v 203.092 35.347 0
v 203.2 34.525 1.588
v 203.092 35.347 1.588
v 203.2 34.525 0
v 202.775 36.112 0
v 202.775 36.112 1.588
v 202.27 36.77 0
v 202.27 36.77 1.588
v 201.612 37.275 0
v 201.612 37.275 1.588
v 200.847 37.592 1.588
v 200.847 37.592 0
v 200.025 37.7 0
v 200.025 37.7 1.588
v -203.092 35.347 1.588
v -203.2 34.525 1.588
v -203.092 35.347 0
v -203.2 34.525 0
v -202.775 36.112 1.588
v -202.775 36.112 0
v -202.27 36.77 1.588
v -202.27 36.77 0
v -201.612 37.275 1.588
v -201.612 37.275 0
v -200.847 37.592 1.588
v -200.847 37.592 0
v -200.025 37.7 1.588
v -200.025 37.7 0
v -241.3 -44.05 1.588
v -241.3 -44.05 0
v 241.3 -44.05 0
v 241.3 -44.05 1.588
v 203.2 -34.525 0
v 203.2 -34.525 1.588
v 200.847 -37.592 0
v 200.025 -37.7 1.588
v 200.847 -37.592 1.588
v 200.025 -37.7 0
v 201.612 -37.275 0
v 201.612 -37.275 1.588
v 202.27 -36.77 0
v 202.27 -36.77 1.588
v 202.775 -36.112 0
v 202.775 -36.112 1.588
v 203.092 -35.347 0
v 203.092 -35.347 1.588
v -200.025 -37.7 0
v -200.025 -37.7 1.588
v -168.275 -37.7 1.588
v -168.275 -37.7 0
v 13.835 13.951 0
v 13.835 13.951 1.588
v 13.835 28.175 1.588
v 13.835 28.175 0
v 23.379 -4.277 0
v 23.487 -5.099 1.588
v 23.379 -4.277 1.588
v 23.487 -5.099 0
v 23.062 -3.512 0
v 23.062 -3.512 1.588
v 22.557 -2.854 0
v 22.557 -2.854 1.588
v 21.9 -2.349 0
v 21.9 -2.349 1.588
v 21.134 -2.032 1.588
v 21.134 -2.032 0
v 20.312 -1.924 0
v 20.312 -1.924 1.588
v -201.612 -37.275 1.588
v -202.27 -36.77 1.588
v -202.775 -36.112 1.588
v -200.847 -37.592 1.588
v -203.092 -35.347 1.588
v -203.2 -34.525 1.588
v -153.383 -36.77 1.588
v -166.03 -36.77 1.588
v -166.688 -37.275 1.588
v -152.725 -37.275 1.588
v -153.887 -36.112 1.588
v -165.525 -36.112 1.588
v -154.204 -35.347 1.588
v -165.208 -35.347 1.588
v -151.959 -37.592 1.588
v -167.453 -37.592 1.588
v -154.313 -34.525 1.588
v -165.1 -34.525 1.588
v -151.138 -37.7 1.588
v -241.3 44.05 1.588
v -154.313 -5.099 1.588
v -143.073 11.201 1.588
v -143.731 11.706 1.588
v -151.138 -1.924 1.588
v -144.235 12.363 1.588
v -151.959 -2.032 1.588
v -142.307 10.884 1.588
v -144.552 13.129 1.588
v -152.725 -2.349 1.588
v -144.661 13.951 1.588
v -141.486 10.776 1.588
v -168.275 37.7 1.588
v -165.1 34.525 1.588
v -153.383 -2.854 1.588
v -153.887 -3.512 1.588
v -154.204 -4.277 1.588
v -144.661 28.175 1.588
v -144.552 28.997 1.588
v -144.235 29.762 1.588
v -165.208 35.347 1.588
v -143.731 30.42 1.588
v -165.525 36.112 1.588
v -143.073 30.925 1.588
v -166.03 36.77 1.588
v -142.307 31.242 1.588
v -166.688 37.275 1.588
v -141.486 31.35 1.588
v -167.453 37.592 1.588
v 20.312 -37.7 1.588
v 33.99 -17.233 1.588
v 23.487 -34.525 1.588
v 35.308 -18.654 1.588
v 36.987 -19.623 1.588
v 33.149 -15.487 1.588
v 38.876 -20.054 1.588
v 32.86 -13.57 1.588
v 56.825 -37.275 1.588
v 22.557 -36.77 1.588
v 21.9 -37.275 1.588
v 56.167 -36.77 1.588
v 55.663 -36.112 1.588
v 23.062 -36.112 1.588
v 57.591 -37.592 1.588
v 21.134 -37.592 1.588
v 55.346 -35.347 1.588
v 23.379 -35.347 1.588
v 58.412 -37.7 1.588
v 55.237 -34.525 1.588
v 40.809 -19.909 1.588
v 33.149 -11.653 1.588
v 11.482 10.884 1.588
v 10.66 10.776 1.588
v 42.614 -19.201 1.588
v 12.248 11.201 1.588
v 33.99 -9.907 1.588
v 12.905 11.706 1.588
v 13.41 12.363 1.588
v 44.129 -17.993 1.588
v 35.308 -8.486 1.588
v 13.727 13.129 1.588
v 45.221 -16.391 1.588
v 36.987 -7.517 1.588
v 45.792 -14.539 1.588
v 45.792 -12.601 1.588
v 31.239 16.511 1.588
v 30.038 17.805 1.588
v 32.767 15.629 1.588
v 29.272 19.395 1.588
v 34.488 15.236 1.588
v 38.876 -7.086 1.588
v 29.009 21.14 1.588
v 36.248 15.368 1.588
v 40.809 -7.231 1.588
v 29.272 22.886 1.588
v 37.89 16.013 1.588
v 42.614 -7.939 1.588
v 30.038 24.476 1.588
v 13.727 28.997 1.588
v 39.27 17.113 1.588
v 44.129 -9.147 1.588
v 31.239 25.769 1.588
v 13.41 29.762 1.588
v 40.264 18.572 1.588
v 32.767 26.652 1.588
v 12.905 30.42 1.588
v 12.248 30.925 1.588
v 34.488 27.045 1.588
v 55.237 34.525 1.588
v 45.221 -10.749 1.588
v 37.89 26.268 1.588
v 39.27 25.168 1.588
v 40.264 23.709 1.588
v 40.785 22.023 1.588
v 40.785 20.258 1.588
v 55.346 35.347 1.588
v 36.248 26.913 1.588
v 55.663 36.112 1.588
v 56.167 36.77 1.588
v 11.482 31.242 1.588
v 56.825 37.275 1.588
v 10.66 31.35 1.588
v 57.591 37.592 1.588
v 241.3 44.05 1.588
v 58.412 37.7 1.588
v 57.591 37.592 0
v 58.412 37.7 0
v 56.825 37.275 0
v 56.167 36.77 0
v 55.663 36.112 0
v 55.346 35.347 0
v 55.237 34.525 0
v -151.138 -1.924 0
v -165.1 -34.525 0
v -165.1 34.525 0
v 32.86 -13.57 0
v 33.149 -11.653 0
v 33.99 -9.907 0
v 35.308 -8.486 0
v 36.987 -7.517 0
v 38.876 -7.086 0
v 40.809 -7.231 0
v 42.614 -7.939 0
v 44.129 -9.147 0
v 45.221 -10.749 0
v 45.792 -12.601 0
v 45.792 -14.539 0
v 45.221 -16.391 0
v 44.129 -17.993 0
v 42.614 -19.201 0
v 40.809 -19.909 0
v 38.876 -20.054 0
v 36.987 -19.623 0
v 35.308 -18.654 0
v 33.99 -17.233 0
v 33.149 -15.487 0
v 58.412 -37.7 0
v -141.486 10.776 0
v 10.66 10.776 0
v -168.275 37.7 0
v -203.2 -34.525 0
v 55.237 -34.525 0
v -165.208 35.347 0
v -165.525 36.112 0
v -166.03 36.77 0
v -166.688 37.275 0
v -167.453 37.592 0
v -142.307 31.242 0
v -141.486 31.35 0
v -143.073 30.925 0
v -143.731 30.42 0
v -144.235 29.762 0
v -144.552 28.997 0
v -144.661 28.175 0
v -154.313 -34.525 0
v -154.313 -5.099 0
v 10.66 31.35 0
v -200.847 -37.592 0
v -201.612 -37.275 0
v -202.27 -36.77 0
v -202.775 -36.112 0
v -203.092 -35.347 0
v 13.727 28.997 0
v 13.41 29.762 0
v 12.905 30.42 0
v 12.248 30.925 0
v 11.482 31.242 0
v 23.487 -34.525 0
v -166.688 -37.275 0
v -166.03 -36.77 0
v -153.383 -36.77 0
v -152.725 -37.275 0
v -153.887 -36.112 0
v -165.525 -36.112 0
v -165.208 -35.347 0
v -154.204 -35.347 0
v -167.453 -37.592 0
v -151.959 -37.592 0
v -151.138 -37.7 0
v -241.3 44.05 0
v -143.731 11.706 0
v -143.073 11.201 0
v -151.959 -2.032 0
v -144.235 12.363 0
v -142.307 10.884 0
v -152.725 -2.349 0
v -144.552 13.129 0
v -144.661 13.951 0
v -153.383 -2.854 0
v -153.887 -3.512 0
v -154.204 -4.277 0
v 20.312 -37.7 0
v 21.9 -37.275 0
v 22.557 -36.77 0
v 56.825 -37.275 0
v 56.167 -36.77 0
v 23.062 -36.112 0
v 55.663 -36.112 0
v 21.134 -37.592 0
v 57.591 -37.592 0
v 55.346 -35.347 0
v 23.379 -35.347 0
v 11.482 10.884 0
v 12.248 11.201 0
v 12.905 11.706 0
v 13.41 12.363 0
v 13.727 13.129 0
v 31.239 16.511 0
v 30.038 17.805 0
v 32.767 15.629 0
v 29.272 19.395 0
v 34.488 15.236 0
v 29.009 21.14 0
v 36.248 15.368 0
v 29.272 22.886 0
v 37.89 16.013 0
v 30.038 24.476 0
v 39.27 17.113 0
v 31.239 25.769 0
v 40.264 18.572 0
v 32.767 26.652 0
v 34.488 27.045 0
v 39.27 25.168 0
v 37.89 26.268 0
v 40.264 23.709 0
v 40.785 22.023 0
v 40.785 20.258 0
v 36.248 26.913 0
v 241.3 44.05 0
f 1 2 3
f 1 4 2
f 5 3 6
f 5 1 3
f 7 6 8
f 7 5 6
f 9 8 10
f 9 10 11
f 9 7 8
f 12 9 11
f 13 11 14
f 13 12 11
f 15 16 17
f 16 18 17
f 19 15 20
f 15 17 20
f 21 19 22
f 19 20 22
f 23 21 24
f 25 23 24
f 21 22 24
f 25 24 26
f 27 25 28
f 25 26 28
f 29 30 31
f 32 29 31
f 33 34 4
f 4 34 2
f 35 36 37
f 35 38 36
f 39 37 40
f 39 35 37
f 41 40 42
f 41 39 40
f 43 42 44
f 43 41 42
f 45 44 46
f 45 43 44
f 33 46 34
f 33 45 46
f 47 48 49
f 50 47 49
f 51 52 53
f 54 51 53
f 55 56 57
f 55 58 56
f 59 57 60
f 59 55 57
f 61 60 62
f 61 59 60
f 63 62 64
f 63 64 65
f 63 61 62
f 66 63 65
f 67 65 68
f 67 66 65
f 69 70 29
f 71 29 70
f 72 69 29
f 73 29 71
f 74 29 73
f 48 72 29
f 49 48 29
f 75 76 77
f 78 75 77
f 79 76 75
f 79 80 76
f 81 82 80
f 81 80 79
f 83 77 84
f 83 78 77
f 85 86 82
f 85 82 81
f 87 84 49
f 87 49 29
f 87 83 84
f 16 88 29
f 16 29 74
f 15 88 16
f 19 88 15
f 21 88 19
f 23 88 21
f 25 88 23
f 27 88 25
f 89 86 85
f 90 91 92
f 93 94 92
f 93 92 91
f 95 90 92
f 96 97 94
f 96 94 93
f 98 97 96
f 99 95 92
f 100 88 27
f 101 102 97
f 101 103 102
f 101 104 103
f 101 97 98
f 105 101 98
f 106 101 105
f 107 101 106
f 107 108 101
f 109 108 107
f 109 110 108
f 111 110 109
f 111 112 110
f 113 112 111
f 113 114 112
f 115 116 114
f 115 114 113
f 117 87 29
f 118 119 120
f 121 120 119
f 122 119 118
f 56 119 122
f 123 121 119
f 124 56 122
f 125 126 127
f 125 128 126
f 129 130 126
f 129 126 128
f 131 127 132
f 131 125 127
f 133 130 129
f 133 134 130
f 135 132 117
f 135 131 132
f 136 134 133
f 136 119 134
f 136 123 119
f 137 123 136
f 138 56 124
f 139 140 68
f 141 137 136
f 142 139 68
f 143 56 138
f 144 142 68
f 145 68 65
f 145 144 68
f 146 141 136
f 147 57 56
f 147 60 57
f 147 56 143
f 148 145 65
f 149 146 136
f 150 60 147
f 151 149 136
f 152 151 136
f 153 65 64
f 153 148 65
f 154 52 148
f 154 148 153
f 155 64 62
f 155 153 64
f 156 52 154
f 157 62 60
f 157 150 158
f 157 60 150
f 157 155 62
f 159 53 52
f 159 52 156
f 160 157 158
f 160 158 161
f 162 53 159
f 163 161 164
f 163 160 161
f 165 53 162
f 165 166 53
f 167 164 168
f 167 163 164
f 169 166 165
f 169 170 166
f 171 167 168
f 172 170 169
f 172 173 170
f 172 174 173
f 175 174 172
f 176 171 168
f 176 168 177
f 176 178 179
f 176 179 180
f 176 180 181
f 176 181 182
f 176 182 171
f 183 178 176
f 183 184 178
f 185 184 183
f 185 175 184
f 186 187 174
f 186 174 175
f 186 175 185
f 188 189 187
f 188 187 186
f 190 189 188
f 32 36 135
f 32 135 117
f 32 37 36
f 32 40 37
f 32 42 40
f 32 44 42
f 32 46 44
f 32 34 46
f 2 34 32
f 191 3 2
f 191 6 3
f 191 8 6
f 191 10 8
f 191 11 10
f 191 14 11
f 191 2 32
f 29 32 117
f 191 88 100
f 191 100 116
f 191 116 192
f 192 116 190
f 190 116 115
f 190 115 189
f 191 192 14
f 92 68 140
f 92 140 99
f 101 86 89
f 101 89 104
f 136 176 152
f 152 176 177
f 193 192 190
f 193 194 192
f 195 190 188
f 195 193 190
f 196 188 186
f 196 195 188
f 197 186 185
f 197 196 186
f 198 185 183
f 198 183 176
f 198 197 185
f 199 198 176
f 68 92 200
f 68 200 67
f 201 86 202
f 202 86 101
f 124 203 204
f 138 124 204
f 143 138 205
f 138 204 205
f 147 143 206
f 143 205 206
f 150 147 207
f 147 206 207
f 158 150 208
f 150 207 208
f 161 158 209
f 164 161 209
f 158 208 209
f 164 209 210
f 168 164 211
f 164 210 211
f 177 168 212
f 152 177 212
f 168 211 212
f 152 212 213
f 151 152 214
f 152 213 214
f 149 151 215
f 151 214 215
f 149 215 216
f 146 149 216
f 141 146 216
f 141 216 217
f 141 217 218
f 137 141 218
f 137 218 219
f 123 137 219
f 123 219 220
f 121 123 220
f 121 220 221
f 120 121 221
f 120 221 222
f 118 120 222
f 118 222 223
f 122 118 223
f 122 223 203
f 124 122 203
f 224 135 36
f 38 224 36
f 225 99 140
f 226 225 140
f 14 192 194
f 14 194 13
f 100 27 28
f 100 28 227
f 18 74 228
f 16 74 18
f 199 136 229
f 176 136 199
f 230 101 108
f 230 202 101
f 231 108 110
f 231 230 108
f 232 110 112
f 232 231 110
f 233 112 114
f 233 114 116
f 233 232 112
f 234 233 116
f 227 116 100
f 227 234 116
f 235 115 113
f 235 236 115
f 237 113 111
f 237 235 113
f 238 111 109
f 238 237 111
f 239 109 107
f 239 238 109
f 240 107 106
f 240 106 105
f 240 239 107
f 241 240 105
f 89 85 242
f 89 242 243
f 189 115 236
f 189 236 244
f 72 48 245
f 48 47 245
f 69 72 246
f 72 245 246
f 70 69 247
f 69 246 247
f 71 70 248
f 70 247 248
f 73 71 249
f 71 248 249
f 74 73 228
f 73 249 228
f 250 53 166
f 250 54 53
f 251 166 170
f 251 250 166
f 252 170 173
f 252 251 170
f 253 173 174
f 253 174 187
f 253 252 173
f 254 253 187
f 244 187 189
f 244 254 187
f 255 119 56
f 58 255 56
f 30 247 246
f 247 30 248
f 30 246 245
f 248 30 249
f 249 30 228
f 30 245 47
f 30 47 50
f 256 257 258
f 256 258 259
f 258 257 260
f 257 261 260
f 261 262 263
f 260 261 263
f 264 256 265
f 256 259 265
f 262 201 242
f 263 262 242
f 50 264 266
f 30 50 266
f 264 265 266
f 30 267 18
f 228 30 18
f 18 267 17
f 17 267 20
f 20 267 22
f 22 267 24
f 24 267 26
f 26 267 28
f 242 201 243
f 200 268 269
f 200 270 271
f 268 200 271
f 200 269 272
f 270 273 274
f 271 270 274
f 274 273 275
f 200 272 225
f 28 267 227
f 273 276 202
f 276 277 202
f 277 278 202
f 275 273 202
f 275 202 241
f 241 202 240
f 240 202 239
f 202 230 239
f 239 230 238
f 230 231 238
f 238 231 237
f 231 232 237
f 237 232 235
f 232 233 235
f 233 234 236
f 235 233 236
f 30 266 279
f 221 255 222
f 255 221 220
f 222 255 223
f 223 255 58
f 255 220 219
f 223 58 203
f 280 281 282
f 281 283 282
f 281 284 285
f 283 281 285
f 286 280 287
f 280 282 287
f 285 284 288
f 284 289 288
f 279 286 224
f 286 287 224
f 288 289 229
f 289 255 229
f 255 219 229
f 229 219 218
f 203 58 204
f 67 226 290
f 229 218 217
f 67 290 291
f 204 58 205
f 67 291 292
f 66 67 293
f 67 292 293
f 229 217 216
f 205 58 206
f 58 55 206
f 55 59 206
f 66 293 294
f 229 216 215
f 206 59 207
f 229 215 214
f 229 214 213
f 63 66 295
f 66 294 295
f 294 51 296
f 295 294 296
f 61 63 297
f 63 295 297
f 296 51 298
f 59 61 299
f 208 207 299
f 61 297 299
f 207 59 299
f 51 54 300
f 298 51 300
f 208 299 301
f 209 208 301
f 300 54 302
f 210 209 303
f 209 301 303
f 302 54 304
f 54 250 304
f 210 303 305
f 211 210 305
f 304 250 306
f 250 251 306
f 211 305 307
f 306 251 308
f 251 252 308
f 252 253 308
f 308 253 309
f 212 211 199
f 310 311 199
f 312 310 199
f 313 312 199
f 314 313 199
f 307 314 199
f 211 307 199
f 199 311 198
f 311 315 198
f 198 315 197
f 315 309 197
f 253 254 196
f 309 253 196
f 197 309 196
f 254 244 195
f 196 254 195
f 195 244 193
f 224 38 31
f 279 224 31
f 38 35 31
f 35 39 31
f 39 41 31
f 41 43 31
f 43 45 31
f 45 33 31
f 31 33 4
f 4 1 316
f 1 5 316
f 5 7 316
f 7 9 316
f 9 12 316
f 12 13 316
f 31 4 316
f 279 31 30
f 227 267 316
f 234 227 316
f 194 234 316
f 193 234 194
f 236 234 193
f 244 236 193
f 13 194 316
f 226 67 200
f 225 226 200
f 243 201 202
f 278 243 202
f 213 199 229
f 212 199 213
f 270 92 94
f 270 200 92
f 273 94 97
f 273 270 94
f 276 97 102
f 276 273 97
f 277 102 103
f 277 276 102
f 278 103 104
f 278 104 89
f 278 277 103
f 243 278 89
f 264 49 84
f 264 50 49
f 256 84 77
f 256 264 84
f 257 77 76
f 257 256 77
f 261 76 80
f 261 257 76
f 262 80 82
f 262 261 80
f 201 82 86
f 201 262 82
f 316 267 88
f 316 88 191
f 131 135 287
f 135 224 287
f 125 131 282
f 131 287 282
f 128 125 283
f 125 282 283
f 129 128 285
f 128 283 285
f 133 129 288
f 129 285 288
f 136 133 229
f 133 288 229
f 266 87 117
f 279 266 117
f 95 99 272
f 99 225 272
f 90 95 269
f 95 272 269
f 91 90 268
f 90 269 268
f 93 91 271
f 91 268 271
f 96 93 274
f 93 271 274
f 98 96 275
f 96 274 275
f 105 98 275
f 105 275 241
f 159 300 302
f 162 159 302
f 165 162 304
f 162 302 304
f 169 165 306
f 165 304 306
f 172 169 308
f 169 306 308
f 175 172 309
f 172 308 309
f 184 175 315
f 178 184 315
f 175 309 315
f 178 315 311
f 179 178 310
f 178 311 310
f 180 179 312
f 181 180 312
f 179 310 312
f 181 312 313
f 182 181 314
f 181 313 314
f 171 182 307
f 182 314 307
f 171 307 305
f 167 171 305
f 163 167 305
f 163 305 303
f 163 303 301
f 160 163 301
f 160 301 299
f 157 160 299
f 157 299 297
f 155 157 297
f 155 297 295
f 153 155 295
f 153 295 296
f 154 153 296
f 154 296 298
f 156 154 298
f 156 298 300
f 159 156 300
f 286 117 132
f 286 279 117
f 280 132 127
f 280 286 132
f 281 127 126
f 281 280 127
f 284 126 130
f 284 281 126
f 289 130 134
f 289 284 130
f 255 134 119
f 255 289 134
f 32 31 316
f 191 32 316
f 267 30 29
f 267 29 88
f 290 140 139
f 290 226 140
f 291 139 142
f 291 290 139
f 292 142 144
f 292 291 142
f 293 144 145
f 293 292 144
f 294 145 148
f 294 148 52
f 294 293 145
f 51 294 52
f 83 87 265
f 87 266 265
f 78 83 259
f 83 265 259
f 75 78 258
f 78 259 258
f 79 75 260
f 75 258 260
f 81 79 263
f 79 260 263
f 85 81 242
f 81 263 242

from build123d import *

# Parameters (mm, degrees)
SKETCH1_W           = 482.6
SKETCH1_H           = 88.0999
BOSS_EXTRUDE1_DEPTH = 1.5875
SKETCH2_W           = 158.496
SKETCH2_H           = 20.574
CUT_EXTRUDE1_DEPTH  = 246.292902978
FILLET1_R           = 3.175
SKETCH3_W           = 177.8
SKETCH3_H           = 35.7759
CUT_EXTRUDE2_DEPTH  = 246.292902978
FILLET2_R           = 3.175
SKETCH4_W           = 38.1
SKETCH4_H           = 75.3999
CUT_EXTRUDE3_DEPTH  = 246.292902978
SKETCH5_W           = 147.96262
SKETCH5_H           = 75.3999
CUT_EXTRUDE4_DEPTH  = 1.5875
FILLET3_R           = 3.175
SKETCH6_R           = 6.5024
SKETCH6_R_2         = 5.92074
CUT_EXTRUDE5_DEPTH  = 246.292902978


with BuildPart() as part:
    # Sketch1 → Boss-Extrude1 (new body)
    with BuildSketch(Plane.XY):
        Rectangle(SKETCH1_W, SKETCH1_H)
    extrude(amount=BOSS_EXTRUDE1_DEPTH)

    # Sketch2 → Cut-Extrude1 (cut, through all)
    with BuildSketch(Plane.XY.offset(1.5875)):
        with Locations((-65.41262, 21.06295)):
            Rectangle(SKETCH2_W, SKETCH2_H)
    extrude(amount=-CUT_EXTRUDE1_DEPTH, mode=Mode.SUBTRACT)

    # Fillet1
    fillet1_edges = [part.edges().sort_by_distance(p)[0] for p in [
        (-144.66062, 10.77595, 0.79375),
        (-144.66062, 31.34995, 0.79375),
        (13.83538, 31.34995, 0.79375),
        (13.83538, 10.77595, 0.79375),
    ]]
    fillet(fillet1_edges, radius=FILLET1_R)

    # Sketch3 → Cut-Extrude2 (cut, through all)
    with BuildSketch(Plane.XY.offset(1.5875)):
        with Locations((-65.41262, -19.812)):
            Rectangle(SKETCH3_W, SKETCH3_H)
    extrude(amount=-CUT_EXTRUDE2_DEPTH, mode=Mode.SUBTRACT)

    # Fillet2
    fillet2_edges = [part.edges().sort_by_distance(p)[0] for p in [
        (-154.31262, -37.69995, 0.79375),
        (-154.31262, -1.92405, 0.79375),
        (23.48738, -1.92405, 0.79375),
        (23.48738, -37.69995, 0.79375),
    ]]
    fillet(fillet2_edges, radius=FILLET2_R)

    # Sketch4 → Cut-Extrude3 (cut, through all)
    with BuildSketch(Plane.XY.offset(1.5875)):
        with Locations((-184.15, 0)):
            Rectangle(SKETCH4_W, SKETCH4_H)
    extrude(amount=-CUT_EXTRUDE3_DEPTH, mode=Mode.SUBTRACT)

    # Sketch5 → Cut-Extrude4 (cut)
    with BuildSketch(Plane.XY.offset(1.5875)):
        with Locations((129.21869, 0)):
            Rectangle(SKETCH5_W, SKETCH5_H)
    extrude(amount=-CUT_EXTRUDE4_DEPTH, mode=Mode.SUBTRACT)

    # Fillet3
    fillet3_edges = [part.edges().sort_by_distance(p)[0] for p in [
        (-203.2, -37.69995, 0.79375),
        (-203.2, 37.69995, 0.79375),
        (-165.1, 37.69995, 0.79375),
        (-165.1, -37.69995, 0.79375),
        (55.23738, -37.69995, 0.79375),
        (55.23738, 37.69995, 0.79375),
        (203.2, 37.69995, 0.79375),
        (203.2, -37.69995, 0.79375),
    ]]
    fillet(fillet3_edges, radius=FILLET3_R)

    # Sketch6 → Cut-Extrude5 (cut, through all)
    with BuildSketch(Plane(origin=(0, 0, 0), x_dir=(-1, 0, 0), z_dir=(0, 0, -1))):
        with Locations((-39.36238, -13.56995)):
            Circle(SKETCH6_R)
        with Locations((-34.93008, 21.14042)):
            Circle(SKETCH6_R_2)
    extrude(amount=-CUT_EXTRUDE5_DEPTH, mode=Mode.SUBTRACT)


solid = part.part
